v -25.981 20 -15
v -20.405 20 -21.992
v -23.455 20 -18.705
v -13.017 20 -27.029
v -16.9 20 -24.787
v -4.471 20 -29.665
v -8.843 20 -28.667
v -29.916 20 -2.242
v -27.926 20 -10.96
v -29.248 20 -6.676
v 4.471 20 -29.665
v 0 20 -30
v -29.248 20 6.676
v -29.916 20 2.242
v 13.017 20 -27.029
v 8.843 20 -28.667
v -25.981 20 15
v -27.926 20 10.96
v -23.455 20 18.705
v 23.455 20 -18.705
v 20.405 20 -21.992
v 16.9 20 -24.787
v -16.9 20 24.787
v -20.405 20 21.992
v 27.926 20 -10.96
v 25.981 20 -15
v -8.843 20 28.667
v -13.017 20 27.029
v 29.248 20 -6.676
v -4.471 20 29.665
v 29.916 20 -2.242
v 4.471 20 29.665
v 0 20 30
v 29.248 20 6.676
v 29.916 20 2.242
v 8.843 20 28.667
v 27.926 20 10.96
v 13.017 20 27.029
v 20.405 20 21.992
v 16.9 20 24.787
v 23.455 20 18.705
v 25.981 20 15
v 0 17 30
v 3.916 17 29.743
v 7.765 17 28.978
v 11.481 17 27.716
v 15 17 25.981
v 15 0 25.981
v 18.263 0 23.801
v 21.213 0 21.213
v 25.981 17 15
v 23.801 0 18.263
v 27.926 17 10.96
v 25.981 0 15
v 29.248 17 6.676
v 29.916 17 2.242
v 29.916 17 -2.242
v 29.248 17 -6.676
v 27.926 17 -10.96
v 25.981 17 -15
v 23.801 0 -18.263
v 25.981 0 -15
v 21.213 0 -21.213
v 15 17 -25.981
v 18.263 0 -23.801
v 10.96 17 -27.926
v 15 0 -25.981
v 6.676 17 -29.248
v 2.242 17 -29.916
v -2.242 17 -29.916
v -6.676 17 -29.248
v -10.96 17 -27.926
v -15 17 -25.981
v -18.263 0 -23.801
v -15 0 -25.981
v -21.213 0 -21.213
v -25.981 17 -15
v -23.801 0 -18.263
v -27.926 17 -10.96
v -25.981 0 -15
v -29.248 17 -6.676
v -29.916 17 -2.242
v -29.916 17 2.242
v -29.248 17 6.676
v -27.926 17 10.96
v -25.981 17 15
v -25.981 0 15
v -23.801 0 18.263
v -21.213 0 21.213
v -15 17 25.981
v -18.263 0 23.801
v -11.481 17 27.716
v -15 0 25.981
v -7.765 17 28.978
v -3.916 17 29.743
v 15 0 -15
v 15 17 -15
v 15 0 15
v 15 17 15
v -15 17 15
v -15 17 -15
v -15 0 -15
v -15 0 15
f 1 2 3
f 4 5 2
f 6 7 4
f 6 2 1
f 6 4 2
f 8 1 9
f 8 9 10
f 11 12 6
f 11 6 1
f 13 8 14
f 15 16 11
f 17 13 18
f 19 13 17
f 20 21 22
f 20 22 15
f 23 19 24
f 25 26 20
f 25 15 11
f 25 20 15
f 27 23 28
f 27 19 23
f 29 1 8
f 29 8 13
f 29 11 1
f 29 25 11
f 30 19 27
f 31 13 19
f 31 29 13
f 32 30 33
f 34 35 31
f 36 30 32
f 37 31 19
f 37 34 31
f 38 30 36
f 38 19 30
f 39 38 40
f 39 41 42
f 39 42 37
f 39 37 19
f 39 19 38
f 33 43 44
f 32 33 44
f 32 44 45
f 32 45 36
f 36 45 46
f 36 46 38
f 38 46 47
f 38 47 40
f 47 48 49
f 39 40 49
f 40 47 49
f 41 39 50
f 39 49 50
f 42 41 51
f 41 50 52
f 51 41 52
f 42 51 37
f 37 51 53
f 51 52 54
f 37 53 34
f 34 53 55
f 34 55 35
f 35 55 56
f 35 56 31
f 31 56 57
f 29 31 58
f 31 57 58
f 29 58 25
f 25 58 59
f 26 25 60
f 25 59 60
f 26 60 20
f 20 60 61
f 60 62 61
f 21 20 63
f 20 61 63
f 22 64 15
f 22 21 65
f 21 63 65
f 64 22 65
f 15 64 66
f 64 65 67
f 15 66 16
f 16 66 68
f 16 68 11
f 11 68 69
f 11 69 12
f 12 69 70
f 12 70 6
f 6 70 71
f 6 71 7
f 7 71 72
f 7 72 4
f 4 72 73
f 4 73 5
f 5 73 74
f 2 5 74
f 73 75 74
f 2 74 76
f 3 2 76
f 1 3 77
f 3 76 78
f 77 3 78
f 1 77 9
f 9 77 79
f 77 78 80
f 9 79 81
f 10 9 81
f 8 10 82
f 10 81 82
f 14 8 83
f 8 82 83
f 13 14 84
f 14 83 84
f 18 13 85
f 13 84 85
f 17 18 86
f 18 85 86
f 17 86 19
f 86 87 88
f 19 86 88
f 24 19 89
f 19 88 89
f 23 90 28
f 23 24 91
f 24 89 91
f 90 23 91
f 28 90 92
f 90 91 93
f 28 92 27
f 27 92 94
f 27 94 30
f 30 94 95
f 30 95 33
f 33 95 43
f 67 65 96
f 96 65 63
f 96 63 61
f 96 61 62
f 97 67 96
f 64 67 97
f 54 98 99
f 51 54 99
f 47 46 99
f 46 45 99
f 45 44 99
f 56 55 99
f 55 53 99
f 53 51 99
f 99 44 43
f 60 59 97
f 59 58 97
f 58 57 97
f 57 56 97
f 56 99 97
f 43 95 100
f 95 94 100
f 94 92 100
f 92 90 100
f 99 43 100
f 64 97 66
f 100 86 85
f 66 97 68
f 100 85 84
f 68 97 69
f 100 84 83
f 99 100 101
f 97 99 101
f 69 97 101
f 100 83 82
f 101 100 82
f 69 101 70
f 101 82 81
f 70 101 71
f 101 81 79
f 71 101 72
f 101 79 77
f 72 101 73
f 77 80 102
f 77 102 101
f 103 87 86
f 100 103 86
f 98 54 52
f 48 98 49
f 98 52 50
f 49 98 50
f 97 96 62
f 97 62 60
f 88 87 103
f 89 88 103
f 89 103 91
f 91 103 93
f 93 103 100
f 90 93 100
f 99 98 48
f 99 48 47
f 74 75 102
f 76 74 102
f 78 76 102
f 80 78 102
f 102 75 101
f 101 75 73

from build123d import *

# Parameters (mm, degrees)
CROQUIS1_R                 = 30
SALIENTE_EXTRUIR1_DEPTH    = 20
CORTAR_EXTRUIR1_DEPTH      = 47.904157598
CORTAR_EXTRUIR1_DEPTH_BACK = 47.904157598
CROQUIS2_W                 = 30
CROQUIS2_H                 = 17
CORTAR_EXTRUIR2_DEPTH      = 47.904157598
CORTAR_EXTRUIR2_DEPTH_BACK = 47.904157598
CROQUIS3_W                 = 30
CROQUIS3_H                 = 17


with BuildPart() as part:
    # Croquis1 → Saliente-Extruir1 (new body)
    with BuildSketch(Plane(origin=(0, 0, 0), x_dir=(1, 0, 0), z_dir=(0, 1, 0))):
        with Locations(Location((0, 0, 0), (0, 0, 270))):
            Circle(CROQUIS1_R)
    extrude(amount=SALIENTE_EXTRUIR1_DEPTH)

    # Croquis2 → Cortar-Extruir1 (cut, two sides: drawn at the far end of the back side and taken through both)
    with BuildSketch(Plane.XY.offset(-CORTAR_EXTRUIR1_DEPTH_BACK)):
        with Locations((0, 8.5)):
            Rectangle(CROQUIS2_W, CROQUIS2_H)
    extrude(amount=CORTAR_EXTRUIR1_DEPTH + CORTAR_EXTRUIR1_DEPTH_BACK, mode=Mode.SUBTRACT)

    # Croquis3 → Cortar-Extruir2 (cut, two sides: drawn at the far end of the back side and taken through both)
    with BuildSketch(Plane(origin=(0, 0, 0), x_dir=(0, 0, -1), z_dir=(1, 0, 0)).offset(-CORTAR_EXTRUIR2_DEPTH_BACK)):
        with Locations((0, 8.5)):
            Rectangle(CROQUIS3_W, CROQUIS3_H)
    extrude(amount=CORTAR_EXTRUIR2_DEPTH + CORTAR_EXTRUIR2_DEPTH_BACK, mode=Mode.SUBTRACT)


solid = part.part
